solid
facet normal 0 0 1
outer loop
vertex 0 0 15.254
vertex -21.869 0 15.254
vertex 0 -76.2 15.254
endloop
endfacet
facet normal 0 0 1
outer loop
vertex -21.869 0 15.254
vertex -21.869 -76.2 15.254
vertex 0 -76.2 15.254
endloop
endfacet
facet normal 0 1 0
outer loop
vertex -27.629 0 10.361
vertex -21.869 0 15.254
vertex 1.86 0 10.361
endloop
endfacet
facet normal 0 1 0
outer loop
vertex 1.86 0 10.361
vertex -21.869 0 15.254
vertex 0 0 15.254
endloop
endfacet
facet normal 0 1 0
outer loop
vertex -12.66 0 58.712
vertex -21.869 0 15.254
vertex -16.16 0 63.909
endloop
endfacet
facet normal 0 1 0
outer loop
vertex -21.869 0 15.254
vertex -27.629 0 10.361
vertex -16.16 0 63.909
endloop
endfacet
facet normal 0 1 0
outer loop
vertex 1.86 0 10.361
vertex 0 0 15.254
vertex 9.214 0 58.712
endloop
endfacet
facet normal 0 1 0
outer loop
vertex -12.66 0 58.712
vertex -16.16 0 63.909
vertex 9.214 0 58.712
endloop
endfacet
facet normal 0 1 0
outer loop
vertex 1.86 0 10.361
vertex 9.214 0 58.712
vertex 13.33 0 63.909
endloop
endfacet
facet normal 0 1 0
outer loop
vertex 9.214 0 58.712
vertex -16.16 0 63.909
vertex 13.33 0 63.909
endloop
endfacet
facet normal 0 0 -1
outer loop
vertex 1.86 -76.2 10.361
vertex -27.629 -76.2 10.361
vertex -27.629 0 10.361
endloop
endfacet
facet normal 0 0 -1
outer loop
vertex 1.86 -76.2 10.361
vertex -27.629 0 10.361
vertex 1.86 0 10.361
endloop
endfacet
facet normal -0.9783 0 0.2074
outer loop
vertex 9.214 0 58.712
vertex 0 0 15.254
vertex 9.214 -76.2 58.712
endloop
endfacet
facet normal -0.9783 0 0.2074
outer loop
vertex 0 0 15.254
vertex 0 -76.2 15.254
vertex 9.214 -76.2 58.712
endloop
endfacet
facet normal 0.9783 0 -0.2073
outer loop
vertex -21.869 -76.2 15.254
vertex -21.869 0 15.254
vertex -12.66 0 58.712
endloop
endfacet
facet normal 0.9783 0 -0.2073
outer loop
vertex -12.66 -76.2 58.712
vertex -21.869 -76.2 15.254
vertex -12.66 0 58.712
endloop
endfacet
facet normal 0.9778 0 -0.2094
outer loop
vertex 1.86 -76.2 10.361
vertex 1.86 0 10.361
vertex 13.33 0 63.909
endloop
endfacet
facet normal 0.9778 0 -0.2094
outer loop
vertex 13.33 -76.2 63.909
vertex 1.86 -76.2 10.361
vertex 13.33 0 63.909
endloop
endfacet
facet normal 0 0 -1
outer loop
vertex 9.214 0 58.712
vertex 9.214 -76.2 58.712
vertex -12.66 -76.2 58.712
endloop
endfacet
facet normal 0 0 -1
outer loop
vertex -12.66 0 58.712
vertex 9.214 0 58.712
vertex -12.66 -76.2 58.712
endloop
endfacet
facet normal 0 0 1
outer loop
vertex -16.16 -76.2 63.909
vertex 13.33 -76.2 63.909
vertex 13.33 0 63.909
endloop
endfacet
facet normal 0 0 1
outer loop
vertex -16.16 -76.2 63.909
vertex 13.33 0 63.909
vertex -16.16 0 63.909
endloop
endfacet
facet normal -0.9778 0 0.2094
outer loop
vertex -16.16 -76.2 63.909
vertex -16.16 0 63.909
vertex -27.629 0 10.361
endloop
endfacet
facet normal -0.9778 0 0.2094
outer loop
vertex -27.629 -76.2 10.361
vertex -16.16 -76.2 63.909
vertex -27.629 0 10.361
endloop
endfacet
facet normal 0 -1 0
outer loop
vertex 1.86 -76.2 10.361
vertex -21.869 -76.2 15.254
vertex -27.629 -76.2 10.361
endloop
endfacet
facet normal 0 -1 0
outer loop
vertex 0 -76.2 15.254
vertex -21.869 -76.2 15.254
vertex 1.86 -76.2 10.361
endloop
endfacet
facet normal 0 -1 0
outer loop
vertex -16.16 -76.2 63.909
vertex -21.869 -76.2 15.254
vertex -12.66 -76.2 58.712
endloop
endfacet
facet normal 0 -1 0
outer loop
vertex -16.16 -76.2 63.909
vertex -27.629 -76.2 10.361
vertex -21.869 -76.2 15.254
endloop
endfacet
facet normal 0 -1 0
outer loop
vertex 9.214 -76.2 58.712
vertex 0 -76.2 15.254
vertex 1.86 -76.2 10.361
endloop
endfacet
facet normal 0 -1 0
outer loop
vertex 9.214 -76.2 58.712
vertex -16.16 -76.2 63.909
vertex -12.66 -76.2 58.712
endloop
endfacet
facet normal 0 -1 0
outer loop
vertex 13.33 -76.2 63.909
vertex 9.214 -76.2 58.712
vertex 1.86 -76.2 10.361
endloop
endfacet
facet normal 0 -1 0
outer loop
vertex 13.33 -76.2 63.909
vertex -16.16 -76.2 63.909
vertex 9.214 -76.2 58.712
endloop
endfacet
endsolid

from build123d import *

# Parameters (mm, degrees)
F1_DEPTH = 76.2
F3_DEPTH = 38.1
F4_DEPTH = 38.1


with BuildPart() as f1:
    # F0 (on Front) → F1 (new body)
    with BuildSketch(Plane.XZ):
        Polygon((13.32986, 63.908778), (-16.15954, 63.908778), (-27.629351, 10.361006), (1.860049, 10.361006), align=None)
    extrude(amount=F1_DEPTH)

    # F2 (on Front) → F3 (cut, symmetric)
    with BuildSketch(Plane.XZ):
        Polygon((9.213624, 58.712374), (-12.659614, 58.712374), (-21.8694, 15.253705), (0, 15.253705), align=None)
    extrude(amount=F3_DEPTH, both=True, mode=Mode.SUBTRACT)

    # F3_face (on face) → F4 (cut, symmetric)
    with BuildSketch(Plane(origin=(-6.328713, -38.1, 36.983675), x_dir=(1, 0, 0), z_dir=(0, 1, 0))):
        Polygon((15.542337, -21.728699), (6.328713, 21.72997), (-15.540687, 21.72997), (-6.330902, -21.728699), align=None)
    extrude(amount=F4_DEPTH, both=True, mode=Mode.SUBTRACT)


solid = f1.part
